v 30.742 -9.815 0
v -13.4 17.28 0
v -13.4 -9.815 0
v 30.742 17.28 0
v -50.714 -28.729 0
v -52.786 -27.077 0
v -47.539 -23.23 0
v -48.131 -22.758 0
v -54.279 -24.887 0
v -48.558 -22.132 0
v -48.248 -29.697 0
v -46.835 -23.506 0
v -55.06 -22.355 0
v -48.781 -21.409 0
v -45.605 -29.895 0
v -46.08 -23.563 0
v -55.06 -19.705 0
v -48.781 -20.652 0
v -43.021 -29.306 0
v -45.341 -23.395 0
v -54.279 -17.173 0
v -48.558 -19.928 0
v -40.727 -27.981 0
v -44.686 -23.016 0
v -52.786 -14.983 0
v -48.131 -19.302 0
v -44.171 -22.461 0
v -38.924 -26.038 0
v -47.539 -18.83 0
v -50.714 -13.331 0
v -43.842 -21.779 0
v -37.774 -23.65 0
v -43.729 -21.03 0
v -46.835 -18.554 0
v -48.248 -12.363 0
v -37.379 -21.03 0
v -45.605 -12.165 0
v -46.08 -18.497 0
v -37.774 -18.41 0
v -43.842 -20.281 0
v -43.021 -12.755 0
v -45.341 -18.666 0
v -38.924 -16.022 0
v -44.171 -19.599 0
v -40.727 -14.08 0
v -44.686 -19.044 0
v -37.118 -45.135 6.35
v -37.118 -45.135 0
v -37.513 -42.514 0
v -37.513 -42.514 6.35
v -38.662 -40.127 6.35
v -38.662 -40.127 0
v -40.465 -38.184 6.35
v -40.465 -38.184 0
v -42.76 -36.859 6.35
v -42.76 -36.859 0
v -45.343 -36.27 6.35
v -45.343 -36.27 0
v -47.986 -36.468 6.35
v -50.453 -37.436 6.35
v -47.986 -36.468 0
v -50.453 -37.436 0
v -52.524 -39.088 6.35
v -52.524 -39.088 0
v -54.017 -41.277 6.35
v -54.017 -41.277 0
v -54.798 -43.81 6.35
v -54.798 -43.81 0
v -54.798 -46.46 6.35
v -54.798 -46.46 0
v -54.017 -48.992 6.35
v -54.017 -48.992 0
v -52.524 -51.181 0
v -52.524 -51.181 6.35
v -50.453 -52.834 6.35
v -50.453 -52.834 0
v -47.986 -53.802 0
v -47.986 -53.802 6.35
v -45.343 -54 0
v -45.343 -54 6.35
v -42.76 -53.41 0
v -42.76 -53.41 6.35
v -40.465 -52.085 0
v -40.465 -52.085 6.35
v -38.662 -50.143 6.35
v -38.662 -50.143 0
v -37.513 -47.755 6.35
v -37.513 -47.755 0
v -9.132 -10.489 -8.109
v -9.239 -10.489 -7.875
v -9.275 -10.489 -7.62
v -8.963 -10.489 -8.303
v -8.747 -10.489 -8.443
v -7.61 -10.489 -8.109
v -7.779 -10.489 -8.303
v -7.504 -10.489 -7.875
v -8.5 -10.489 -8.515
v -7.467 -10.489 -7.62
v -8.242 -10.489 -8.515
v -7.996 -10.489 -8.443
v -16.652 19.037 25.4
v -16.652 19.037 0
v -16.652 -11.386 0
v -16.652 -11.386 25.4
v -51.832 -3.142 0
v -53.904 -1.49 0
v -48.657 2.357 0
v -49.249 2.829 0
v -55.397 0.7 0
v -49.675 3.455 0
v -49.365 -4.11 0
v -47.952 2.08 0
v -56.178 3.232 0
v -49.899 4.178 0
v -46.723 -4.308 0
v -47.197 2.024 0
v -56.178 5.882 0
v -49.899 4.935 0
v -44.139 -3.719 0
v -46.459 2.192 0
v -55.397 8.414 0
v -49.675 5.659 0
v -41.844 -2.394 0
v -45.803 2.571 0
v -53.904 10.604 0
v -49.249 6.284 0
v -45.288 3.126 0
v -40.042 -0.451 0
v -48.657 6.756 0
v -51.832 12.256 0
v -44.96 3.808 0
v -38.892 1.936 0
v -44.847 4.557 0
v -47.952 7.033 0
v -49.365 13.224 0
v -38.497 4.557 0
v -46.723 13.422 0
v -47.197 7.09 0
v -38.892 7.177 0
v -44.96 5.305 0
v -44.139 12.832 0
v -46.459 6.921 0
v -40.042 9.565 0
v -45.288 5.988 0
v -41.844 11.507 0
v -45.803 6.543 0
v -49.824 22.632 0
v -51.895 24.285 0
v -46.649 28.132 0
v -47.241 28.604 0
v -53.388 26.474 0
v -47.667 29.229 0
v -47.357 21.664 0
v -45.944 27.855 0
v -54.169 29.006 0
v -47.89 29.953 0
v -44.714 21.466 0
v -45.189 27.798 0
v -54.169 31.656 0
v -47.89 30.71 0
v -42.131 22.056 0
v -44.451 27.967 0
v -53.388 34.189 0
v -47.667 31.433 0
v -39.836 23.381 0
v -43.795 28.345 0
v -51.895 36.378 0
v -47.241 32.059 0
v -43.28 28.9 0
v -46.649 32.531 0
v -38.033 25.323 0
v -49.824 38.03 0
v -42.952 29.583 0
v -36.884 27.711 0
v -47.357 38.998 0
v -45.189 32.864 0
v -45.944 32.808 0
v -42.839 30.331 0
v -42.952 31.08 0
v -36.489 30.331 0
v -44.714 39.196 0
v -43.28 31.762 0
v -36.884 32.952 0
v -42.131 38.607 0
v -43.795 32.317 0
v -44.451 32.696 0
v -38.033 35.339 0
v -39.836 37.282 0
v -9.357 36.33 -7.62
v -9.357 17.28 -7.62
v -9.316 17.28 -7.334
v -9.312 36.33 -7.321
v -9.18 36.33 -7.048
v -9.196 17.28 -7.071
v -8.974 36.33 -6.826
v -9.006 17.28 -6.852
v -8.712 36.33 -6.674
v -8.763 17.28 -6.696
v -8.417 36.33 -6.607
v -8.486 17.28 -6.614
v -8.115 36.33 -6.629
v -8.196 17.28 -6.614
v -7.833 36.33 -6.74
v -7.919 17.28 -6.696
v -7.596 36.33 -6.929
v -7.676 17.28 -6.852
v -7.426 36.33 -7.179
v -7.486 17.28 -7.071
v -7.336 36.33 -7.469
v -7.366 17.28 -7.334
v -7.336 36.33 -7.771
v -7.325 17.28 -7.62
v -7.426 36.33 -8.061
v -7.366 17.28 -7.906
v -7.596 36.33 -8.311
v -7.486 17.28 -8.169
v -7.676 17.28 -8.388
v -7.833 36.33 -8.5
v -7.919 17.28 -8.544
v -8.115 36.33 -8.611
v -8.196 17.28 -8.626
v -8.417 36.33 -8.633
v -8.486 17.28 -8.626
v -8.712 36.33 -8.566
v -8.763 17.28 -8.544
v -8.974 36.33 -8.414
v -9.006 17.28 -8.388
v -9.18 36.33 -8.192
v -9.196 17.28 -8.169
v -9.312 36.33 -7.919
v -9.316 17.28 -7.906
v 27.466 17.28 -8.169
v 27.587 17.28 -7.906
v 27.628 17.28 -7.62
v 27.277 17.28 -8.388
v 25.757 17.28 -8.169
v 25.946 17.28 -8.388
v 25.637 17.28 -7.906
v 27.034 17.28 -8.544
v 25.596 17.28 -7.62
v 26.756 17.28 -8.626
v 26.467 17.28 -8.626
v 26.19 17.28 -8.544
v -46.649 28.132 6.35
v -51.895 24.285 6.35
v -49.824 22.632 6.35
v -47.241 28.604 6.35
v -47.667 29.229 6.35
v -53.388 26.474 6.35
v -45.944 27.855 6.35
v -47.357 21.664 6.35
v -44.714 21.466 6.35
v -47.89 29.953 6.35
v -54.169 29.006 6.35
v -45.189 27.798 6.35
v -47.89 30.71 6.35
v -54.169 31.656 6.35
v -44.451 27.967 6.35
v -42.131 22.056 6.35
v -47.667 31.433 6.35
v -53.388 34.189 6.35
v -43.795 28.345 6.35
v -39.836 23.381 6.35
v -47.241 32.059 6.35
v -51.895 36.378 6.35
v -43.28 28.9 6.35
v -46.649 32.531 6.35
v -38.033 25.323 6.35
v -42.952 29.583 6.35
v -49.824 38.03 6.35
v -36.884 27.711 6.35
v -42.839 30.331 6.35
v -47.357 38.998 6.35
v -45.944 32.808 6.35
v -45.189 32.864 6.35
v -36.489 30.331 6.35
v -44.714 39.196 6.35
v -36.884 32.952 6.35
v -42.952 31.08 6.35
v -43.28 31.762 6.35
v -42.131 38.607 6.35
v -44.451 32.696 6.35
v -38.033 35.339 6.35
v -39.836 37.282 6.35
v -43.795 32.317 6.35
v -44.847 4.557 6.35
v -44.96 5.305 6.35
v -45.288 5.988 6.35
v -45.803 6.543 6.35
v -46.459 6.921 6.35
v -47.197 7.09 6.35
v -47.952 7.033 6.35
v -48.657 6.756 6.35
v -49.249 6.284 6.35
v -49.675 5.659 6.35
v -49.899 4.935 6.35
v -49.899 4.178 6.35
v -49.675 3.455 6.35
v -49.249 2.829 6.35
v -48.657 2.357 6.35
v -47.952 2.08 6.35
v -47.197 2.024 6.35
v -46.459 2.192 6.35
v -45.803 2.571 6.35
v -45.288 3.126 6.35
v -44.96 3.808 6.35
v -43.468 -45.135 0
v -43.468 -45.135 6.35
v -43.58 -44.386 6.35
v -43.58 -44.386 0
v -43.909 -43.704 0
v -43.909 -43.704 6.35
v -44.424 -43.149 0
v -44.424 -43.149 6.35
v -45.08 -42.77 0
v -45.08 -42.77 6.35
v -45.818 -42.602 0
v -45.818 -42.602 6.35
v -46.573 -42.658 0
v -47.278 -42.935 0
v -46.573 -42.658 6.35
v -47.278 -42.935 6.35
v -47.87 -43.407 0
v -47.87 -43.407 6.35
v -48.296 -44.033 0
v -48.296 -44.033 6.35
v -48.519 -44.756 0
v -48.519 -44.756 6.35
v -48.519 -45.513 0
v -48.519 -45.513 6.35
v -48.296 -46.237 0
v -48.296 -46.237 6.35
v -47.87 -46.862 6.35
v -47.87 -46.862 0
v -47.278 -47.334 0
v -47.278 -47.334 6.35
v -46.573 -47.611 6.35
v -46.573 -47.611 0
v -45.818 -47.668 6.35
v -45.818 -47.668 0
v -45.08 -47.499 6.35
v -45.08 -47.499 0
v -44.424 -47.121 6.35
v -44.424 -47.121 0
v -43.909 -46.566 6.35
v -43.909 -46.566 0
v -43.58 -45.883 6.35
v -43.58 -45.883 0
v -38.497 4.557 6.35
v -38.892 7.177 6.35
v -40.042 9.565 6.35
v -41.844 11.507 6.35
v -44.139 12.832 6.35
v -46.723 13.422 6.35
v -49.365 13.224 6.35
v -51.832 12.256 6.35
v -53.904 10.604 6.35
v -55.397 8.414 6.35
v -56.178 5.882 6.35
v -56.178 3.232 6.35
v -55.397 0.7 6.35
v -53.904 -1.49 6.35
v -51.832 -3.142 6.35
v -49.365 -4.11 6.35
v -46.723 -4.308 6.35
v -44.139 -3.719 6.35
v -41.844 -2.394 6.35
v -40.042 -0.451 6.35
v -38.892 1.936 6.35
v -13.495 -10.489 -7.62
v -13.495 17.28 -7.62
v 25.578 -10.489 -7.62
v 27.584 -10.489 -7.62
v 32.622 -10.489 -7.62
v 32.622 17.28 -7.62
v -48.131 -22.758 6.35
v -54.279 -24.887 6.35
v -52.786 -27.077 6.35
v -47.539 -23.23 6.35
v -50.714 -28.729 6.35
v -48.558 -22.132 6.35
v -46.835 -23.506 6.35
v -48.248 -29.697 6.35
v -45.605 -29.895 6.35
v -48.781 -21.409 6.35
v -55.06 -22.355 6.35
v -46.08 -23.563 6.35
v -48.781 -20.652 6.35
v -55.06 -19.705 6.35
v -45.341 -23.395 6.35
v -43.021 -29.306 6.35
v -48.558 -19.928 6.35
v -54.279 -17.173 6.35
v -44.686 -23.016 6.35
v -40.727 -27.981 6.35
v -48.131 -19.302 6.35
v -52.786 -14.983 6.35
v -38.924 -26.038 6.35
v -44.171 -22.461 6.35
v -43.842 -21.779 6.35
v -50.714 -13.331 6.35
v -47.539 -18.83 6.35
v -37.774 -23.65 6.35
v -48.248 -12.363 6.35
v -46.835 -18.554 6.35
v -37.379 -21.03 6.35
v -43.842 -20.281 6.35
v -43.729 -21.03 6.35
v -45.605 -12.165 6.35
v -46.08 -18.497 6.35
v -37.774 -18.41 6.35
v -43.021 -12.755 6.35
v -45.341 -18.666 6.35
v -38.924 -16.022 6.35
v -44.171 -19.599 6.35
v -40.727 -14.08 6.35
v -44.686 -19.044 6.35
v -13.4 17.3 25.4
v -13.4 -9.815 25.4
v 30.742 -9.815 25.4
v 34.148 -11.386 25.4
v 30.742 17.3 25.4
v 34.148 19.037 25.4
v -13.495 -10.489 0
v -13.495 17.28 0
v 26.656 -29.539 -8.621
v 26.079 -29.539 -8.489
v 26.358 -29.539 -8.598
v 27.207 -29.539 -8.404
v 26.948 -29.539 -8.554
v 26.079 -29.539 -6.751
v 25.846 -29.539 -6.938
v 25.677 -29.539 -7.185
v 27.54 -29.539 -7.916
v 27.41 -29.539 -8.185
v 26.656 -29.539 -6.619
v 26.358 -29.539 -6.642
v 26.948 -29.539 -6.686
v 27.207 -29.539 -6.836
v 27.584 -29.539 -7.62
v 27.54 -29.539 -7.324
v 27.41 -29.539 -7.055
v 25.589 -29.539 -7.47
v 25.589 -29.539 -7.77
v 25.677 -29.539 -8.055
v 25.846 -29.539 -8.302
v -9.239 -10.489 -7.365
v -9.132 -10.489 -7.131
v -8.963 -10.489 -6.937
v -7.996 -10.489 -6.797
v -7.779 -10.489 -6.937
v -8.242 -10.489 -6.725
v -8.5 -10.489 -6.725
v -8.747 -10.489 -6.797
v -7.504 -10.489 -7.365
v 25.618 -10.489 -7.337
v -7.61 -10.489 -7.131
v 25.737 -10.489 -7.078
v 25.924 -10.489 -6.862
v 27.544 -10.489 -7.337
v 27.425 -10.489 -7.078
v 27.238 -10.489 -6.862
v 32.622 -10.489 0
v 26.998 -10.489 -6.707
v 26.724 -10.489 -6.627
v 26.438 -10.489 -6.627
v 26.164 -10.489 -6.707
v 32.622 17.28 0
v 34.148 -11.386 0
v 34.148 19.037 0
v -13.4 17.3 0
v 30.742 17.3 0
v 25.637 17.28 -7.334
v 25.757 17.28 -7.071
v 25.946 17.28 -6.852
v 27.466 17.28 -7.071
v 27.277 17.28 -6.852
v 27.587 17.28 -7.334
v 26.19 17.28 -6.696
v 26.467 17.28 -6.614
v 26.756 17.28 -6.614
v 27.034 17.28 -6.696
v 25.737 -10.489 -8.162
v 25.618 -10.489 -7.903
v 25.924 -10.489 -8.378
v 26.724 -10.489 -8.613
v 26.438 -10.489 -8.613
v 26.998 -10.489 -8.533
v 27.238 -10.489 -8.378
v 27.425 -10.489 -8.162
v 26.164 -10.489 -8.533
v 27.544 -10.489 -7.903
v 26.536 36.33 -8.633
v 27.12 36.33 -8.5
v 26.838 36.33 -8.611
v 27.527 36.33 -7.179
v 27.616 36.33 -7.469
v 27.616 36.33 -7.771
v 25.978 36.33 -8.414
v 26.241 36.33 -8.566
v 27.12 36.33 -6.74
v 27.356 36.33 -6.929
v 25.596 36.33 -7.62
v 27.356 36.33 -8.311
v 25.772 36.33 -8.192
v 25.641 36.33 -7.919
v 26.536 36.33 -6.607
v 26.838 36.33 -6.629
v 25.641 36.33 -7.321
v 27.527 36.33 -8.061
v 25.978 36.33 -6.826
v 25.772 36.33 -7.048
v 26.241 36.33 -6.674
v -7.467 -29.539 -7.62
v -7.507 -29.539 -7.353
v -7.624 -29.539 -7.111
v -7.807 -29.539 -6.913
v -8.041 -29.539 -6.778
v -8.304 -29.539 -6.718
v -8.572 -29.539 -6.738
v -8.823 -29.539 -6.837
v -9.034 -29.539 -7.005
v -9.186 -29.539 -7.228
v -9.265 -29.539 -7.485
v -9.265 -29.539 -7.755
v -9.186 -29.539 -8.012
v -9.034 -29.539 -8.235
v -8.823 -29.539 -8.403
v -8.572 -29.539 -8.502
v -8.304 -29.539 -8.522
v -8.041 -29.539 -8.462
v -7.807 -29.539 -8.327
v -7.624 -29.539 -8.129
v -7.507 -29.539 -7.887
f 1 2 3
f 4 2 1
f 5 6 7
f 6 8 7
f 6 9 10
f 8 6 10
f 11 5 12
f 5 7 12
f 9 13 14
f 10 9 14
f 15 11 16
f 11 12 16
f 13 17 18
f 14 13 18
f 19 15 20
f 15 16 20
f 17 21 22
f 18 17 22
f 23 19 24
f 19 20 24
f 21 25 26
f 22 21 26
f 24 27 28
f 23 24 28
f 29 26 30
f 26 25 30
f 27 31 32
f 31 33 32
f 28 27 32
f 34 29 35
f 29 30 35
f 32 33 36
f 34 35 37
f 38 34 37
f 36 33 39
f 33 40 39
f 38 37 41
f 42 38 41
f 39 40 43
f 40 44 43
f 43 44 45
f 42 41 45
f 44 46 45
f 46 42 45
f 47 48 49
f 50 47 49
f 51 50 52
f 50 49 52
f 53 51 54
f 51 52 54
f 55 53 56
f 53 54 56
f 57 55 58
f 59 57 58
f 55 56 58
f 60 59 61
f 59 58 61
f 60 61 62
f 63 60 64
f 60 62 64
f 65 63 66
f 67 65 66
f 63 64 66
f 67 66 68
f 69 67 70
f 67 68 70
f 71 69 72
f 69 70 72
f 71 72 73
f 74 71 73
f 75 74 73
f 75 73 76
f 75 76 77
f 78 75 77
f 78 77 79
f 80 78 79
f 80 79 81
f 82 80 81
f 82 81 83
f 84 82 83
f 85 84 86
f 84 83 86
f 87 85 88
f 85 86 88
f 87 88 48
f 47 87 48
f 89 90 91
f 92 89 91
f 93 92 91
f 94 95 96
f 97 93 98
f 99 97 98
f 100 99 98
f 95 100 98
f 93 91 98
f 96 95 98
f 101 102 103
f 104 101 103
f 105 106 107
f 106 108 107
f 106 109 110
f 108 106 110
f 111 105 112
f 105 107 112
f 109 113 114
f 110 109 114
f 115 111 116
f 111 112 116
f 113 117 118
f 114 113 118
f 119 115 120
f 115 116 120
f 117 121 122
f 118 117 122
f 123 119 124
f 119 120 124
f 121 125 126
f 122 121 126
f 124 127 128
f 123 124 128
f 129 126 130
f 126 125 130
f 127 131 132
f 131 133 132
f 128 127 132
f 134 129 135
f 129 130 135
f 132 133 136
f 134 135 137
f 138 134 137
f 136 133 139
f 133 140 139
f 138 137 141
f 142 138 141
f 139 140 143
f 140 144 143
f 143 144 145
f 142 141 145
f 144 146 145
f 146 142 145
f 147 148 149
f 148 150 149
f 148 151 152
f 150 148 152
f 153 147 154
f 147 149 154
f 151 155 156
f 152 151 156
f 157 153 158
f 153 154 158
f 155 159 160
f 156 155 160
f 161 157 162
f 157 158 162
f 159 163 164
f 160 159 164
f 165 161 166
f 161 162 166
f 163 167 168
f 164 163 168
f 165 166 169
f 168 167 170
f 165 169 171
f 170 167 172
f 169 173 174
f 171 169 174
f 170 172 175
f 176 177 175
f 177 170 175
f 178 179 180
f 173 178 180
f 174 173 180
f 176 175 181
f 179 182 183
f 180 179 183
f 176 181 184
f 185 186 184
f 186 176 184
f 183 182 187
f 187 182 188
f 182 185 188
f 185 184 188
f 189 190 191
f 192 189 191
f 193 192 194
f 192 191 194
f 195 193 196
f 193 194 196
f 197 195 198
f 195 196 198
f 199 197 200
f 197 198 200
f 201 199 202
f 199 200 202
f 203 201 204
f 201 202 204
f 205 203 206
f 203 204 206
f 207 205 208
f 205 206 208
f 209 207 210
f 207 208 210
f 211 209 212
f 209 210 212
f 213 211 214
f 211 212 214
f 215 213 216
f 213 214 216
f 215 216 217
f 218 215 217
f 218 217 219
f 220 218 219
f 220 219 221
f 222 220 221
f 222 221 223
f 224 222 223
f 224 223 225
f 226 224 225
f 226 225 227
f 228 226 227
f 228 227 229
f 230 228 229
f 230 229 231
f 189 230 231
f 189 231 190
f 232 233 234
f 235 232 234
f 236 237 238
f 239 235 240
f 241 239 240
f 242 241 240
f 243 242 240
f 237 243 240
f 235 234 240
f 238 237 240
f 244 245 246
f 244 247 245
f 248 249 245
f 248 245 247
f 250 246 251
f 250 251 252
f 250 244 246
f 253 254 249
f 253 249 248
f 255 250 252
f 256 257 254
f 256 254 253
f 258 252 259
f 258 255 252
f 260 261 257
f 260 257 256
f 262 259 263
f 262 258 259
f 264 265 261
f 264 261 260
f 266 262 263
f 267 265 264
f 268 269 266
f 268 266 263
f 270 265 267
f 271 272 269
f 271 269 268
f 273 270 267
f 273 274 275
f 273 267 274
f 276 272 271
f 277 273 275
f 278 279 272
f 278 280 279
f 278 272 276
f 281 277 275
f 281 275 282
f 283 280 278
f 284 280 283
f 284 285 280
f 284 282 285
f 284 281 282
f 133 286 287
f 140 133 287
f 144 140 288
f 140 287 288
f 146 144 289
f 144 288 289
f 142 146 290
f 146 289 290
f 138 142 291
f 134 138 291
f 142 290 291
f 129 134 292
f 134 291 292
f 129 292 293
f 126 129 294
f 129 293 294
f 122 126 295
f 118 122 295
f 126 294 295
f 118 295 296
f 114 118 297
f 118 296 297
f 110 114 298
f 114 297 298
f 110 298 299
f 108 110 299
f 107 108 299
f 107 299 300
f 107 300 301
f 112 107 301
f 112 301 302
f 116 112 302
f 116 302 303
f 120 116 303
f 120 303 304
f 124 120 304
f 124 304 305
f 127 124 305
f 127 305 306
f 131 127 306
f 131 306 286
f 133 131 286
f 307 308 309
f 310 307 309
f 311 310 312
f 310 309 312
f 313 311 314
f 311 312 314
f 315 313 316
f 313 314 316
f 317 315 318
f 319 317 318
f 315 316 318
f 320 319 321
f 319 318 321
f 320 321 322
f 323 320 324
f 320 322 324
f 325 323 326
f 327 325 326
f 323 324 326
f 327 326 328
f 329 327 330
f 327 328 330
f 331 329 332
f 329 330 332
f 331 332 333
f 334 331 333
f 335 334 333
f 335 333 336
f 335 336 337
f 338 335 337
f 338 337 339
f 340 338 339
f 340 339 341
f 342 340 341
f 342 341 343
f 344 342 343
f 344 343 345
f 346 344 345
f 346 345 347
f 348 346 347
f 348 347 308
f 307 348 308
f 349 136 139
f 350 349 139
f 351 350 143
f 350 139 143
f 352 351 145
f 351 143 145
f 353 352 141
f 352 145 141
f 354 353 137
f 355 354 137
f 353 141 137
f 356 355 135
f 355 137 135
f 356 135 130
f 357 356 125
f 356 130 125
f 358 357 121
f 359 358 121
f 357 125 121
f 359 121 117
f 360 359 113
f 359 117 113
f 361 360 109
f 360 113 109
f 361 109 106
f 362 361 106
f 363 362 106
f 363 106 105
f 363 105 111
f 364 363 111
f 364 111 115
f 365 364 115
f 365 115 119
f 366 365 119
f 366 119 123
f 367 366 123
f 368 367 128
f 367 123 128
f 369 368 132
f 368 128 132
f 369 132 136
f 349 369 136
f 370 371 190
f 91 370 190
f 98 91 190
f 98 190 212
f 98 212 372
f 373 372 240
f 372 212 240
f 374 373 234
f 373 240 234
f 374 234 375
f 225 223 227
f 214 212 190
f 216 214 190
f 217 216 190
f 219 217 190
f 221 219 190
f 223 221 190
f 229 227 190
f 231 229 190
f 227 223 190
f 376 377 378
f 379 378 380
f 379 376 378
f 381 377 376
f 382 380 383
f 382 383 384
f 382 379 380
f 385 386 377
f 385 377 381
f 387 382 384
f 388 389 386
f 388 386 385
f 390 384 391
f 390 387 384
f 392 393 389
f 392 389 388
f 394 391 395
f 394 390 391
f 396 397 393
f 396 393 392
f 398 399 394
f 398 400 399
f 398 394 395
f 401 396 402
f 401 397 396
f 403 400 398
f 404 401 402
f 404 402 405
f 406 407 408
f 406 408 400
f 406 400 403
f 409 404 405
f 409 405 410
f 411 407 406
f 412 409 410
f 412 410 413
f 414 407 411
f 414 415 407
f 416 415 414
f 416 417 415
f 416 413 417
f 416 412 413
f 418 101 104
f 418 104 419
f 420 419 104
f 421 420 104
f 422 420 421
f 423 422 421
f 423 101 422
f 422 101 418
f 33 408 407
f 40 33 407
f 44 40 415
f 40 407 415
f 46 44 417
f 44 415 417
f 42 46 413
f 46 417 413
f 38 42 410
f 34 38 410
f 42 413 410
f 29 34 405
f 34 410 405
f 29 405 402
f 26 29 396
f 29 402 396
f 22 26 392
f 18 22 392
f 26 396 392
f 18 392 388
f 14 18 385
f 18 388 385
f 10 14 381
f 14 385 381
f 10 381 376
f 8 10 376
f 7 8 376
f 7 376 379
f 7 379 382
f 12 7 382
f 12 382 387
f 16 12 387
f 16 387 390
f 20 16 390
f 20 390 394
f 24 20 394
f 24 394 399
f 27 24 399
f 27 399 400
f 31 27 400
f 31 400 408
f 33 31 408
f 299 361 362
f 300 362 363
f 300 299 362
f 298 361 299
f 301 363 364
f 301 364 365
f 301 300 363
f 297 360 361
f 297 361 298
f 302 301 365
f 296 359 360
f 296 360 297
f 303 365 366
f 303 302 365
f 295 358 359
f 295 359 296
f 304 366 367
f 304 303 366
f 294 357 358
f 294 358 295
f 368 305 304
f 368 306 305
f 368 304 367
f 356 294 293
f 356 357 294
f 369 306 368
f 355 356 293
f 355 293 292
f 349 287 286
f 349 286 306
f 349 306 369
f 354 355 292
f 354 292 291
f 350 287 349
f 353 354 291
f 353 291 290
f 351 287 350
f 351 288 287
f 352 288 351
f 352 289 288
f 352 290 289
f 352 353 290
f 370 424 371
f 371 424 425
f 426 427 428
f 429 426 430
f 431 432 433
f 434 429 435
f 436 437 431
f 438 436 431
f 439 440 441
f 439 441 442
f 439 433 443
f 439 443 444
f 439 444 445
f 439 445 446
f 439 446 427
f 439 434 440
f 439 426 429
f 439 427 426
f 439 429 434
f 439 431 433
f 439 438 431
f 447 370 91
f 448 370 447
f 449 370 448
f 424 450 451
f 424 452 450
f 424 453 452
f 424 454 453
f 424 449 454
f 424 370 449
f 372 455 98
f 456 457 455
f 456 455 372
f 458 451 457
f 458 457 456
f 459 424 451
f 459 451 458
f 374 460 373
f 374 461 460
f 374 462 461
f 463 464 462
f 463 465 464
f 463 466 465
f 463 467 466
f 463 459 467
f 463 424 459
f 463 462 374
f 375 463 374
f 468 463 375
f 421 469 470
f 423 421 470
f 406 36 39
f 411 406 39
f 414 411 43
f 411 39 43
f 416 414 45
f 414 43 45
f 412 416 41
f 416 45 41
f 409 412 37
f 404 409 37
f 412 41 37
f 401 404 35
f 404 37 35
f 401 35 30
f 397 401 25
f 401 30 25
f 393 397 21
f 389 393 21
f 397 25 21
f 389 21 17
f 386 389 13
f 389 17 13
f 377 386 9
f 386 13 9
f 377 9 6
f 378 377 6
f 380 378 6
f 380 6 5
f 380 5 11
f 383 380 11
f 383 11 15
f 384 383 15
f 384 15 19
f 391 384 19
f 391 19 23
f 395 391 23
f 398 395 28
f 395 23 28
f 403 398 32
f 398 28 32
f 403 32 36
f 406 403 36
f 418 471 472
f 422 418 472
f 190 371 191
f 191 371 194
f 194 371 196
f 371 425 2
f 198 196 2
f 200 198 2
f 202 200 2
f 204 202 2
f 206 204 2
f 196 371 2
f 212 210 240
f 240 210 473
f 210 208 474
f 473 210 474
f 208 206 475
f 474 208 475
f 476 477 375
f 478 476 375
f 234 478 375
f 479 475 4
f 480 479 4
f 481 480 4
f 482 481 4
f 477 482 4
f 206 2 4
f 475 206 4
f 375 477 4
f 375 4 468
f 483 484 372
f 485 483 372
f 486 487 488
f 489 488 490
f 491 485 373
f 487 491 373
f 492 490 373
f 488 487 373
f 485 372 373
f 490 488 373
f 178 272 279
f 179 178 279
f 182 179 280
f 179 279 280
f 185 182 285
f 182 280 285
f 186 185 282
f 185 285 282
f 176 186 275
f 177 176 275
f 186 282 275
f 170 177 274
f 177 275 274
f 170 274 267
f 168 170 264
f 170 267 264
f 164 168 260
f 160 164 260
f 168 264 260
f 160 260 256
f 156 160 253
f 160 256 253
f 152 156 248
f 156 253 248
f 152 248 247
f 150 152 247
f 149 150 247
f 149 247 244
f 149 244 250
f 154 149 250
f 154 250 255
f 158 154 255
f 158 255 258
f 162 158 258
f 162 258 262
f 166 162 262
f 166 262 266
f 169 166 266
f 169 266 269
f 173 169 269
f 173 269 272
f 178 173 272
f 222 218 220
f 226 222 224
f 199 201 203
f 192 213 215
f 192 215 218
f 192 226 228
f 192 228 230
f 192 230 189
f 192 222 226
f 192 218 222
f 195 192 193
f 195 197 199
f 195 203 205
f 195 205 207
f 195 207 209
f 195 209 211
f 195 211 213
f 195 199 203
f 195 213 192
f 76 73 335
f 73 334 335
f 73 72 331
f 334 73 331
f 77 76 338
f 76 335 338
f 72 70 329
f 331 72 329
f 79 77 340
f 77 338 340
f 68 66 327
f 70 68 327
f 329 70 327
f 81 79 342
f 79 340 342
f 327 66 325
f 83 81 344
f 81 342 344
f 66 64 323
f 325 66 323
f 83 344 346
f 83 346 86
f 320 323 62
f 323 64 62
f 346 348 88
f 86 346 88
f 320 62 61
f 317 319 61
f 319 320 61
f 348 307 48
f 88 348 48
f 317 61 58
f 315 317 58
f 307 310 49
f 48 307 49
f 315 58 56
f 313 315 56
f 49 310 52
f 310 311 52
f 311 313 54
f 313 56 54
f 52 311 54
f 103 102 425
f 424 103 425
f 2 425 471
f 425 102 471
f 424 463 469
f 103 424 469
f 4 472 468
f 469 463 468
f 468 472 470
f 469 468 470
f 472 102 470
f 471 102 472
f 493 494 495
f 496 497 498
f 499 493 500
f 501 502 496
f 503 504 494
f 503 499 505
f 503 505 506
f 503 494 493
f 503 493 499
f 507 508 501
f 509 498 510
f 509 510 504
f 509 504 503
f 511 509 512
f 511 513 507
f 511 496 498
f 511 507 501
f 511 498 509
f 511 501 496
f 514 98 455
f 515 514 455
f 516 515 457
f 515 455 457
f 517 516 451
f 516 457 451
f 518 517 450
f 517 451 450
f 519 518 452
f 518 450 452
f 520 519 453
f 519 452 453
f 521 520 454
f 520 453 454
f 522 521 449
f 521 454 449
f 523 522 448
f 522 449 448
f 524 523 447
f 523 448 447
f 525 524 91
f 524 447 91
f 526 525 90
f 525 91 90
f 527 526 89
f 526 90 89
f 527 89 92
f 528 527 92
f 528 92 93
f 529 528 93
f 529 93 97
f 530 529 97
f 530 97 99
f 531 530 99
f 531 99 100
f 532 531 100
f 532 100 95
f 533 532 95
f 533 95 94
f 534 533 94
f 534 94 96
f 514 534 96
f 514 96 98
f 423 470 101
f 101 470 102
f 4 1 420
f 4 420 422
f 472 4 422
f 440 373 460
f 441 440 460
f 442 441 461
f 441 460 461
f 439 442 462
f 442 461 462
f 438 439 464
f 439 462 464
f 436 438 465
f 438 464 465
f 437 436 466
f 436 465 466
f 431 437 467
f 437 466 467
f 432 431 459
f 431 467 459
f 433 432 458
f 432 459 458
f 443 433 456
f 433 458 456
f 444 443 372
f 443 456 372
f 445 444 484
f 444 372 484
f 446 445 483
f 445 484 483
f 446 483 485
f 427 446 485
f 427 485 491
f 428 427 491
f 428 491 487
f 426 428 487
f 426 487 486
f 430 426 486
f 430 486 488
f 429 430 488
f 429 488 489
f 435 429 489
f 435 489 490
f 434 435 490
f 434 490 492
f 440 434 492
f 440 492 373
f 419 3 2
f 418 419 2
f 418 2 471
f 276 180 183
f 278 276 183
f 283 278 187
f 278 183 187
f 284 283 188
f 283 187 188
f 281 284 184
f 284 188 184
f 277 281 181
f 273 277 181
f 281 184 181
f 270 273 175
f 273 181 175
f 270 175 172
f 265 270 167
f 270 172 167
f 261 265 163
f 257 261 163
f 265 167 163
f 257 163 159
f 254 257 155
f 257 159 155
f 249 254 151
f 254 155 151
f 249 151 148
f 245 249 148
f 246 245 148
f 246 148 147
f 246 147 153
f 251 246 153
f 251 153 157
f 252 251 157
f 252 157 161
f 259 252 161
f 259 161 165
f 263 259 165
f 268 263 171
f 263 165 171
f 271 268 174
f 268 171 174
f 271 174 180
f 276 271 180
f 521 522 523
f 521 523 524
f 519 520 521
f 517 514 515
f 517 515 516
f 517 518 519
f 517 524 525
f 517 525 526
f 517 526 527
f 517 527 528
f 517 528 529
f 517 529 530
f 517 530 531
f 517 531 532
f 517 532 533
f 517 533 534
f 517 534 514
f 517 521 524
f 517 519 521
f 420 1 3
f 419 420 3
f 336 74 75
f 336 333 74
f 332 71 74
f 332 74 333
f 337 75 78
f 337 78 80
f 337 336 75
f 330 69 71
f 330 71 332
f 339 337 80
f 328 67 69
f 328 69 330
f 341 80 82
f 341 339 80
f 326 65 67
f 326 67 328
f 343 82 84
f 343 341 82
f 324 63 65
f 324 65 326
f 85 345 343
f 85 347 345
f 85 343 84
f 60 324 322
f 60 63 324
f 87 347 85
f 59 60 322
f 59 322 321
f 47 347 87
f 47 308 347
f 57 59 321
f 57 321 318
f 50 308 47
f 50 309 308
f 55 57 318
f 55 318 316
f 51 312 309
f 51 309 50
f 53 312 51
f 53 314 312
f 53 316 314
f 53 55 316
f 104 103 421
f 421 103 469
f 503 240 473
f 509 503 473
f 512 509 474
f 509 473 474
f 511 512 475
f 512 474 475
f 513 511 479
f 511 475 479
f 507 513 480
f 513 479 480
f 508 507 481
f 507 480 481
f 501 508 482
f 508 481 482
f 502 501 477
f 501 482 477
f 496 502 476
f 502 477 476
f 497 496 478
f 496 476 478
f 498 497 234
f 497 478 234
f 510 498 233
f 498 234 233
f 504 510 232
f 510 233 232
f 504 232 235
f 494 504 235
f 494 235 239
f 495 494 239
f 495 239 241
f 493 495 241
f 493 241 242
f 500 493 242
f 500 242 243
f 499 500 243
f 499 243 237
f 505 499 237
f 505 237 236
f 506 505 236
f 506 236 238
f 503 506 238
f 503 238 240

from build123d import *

# Parameters (mm, degrees)
F0_W      = 3.2517500222
F0_H      = 27.1141631529
F0_W_2    = 3.4065774262
F1_DEPTH  = 25.4
F2_DEPTH  = 25.4
F3_W      = 46.1175404489
F3_H      = 27.7686519548
F4_DEPTH  = 7.62
F5_R      = 1.016
F6_DEPTH  = 19.05
F7_R      = 0.9042601728
F7_R_2    = 1.0033209585
F8_DEPTH  = 19.05
F9_R      = 8.89
F10_DEPTH = 6.35
F11_R     = 2.54
F12_DEPTH = 25.4
F13_R     = 2.54
F14_DEPTH = 25.4
F15_R     = 2.54
F16_DEPTH = 25.4
F17_R     = 2.54
F18_DEPTH = 25.4


with BuildPart() as f1:
    # F0 (on Top) → F1 (new body)
    with BuildSketch(Plane.XY):
        Polygon((34.1480995148, 19.0366730094), (-16.6519004852, 19.0366730094), (-16.6519004852, 17.2996520996), (-13.400150463, 17.2996520996), (30.7415220886, 17.2996520996), (34.1480995148, 17.2996520996), align=None)
        with Locations((-15.0260254741, 3.7425705232)):
            Rectangle(F0_W, F0_H)
        with Locations((32.4448108017, 3.7425705232)):
            Rectangle(F0_W_2, F0_H)
        Polygon((-13.400150463, -9.8145110533), (-16.6519004852, -9.8145110533), (-16.6519004852, -11.3855972886), (34.1480995148, -11.3855972886), (34.1480995148, -9.8145110533), (30.7415220886, -9.8145110533), align=None)
    extrude(amount=F1_DEPTH)

    # F0 (on Top) → F2 (join)
    with BuildSketch(Plane.XY):
        Polygon((34.1480995148, 19.0366730094), (-16.6519004852, 19.0366730094), (-16.6519004852, 17.2996520996), (-13.400150463, 17.2996520996), (30.7415220886, 17.2996520996), (34.1480995148, 17.2996520996), align=None)
        with Locations((-15.0260254741, 3.7425705232)):
            Rectangle(F0_W, F0_H)
        with Locations((32.4448108017, 3.7425705232)):
            Rectangle(F0_W_2, F0_H)
        Polygon((-13.400150463, -9.8145110533), (-16.6519004852, -9.8145110533), (-16.6519004852, -11.3855972886), (34.1480995148, -11.3855972886), (34.1480995148, -9.8145110533), (30.7415220886, -9.8145110533), align=None)
    extrude(amount=F2_DEPTH)

    # F3 (on Top) → F4 (join)
    with BuildSketch(Plane.XY):
        with Locations((9.5635969192, 3.3954721875)):
            Rectangle(F3_W, F3_H)
    extrude(amount=-F4_DEPTH)

    # F5 (on face) → F6 (join)
    with BuildSketch(Plane(origin=(0, 17.279798165, 0), x_dir=(-1, 0, 0), z_dir=(0, 1, 0))):
        with Locations((-26.611706242, -7.62)):
            Circle(F5_R)
        with Locations((8.3409249783, -7.62)):
            Circle(F5_R)
    extrude(amount=F6_DEPTH)

    # F7 (on face) → F8 (join)
    with BuildSketch(Plane.XZ.offset(10.4888537899)):
        with Locations((-8.3711668849, -7.62)):
            Circle(F7_R)
        with Locations((26.5810359269, -7.62)):
            Circle(F7_R_2)
    extrude(amount=F8_DEPTH)


with BuildPart() as f10:
    # F9 (on Top) → F10 (new body)
    with BuildSketch(Plane.XY):
        with Locations((-45.3786626458, 30.3313024342)):
            Circle(F9_R)
    extrude(amount=F10_DEPTH)

    # F11 (on face) → F12 (cut)
    with BuildSketch(Plane.XY.offset(6.35)):
        with Locations((-45.3786626458, 30.3313024342)):
            Circle(F11_R)
    extrude(amount=-F12_DEPTH, mode=Mode.SUBTRACT)


with BuildPart() as f10b:
    # F9 (on Top) → F10, piece 2 (new body)
    with BuildSketch(Plane.XY):
        with Locations((-47.3869070411, 4.5567816123)):
            Circle(F9_R)
    extrude(amount=F10_DEPTH)

    # F13 (on face) → F14 (cut)
    with BuildSketch(Plane.XY.offset(6.35)):
        with Locations((-47.3869070411, 4.5567816123)):
            Circle(F13_R)
    extrude(amount=-F14_DEPTH, mode=Mode.SUBTRACT)


with BuildPart() as f10c:
    # F9 (on Top) → F10, piece 3 (new body)
    with BuildSketch(Plane.XY):
        with Locations((-46.2693721056, -21.0301224142)):
            Circle(F9_R)
    extrude(amount=F10_DEPTH)

    # F15 (on face) → F16 (cut)
    with BuildSketch(Plane.XY.offset(6.35)):
        with Locations((-46.2693721056, -21.0301224142)):
            Circle(F15_R)
    extrude(amount=-F16_DEPTH, mode=Mode.SUBTRACT)


with BuildPart() as f10d:
    # F9 (on Top) → F10, piece 4 (new body)
    with BuildSketch(Plane.XY):
        with Locations((-46.0076406598, -45.1347231865)):
            Circle(F9_R)
    extrude(amount=F10_DEPTH)

    # F17 (on face) → F18 (cut)
    with BuildSketch(Plane.XY.offset(6.35)):
        with Locations((-46.0076406598, -45.1347231865)):
            Circle(F17_R)
    extrude(amount=-F18_DEPTH, mode=Mode.SUBTRACT)


solid = Compound([f1.part, f10.part, f10b.part, f10c.part, f10d.part])
